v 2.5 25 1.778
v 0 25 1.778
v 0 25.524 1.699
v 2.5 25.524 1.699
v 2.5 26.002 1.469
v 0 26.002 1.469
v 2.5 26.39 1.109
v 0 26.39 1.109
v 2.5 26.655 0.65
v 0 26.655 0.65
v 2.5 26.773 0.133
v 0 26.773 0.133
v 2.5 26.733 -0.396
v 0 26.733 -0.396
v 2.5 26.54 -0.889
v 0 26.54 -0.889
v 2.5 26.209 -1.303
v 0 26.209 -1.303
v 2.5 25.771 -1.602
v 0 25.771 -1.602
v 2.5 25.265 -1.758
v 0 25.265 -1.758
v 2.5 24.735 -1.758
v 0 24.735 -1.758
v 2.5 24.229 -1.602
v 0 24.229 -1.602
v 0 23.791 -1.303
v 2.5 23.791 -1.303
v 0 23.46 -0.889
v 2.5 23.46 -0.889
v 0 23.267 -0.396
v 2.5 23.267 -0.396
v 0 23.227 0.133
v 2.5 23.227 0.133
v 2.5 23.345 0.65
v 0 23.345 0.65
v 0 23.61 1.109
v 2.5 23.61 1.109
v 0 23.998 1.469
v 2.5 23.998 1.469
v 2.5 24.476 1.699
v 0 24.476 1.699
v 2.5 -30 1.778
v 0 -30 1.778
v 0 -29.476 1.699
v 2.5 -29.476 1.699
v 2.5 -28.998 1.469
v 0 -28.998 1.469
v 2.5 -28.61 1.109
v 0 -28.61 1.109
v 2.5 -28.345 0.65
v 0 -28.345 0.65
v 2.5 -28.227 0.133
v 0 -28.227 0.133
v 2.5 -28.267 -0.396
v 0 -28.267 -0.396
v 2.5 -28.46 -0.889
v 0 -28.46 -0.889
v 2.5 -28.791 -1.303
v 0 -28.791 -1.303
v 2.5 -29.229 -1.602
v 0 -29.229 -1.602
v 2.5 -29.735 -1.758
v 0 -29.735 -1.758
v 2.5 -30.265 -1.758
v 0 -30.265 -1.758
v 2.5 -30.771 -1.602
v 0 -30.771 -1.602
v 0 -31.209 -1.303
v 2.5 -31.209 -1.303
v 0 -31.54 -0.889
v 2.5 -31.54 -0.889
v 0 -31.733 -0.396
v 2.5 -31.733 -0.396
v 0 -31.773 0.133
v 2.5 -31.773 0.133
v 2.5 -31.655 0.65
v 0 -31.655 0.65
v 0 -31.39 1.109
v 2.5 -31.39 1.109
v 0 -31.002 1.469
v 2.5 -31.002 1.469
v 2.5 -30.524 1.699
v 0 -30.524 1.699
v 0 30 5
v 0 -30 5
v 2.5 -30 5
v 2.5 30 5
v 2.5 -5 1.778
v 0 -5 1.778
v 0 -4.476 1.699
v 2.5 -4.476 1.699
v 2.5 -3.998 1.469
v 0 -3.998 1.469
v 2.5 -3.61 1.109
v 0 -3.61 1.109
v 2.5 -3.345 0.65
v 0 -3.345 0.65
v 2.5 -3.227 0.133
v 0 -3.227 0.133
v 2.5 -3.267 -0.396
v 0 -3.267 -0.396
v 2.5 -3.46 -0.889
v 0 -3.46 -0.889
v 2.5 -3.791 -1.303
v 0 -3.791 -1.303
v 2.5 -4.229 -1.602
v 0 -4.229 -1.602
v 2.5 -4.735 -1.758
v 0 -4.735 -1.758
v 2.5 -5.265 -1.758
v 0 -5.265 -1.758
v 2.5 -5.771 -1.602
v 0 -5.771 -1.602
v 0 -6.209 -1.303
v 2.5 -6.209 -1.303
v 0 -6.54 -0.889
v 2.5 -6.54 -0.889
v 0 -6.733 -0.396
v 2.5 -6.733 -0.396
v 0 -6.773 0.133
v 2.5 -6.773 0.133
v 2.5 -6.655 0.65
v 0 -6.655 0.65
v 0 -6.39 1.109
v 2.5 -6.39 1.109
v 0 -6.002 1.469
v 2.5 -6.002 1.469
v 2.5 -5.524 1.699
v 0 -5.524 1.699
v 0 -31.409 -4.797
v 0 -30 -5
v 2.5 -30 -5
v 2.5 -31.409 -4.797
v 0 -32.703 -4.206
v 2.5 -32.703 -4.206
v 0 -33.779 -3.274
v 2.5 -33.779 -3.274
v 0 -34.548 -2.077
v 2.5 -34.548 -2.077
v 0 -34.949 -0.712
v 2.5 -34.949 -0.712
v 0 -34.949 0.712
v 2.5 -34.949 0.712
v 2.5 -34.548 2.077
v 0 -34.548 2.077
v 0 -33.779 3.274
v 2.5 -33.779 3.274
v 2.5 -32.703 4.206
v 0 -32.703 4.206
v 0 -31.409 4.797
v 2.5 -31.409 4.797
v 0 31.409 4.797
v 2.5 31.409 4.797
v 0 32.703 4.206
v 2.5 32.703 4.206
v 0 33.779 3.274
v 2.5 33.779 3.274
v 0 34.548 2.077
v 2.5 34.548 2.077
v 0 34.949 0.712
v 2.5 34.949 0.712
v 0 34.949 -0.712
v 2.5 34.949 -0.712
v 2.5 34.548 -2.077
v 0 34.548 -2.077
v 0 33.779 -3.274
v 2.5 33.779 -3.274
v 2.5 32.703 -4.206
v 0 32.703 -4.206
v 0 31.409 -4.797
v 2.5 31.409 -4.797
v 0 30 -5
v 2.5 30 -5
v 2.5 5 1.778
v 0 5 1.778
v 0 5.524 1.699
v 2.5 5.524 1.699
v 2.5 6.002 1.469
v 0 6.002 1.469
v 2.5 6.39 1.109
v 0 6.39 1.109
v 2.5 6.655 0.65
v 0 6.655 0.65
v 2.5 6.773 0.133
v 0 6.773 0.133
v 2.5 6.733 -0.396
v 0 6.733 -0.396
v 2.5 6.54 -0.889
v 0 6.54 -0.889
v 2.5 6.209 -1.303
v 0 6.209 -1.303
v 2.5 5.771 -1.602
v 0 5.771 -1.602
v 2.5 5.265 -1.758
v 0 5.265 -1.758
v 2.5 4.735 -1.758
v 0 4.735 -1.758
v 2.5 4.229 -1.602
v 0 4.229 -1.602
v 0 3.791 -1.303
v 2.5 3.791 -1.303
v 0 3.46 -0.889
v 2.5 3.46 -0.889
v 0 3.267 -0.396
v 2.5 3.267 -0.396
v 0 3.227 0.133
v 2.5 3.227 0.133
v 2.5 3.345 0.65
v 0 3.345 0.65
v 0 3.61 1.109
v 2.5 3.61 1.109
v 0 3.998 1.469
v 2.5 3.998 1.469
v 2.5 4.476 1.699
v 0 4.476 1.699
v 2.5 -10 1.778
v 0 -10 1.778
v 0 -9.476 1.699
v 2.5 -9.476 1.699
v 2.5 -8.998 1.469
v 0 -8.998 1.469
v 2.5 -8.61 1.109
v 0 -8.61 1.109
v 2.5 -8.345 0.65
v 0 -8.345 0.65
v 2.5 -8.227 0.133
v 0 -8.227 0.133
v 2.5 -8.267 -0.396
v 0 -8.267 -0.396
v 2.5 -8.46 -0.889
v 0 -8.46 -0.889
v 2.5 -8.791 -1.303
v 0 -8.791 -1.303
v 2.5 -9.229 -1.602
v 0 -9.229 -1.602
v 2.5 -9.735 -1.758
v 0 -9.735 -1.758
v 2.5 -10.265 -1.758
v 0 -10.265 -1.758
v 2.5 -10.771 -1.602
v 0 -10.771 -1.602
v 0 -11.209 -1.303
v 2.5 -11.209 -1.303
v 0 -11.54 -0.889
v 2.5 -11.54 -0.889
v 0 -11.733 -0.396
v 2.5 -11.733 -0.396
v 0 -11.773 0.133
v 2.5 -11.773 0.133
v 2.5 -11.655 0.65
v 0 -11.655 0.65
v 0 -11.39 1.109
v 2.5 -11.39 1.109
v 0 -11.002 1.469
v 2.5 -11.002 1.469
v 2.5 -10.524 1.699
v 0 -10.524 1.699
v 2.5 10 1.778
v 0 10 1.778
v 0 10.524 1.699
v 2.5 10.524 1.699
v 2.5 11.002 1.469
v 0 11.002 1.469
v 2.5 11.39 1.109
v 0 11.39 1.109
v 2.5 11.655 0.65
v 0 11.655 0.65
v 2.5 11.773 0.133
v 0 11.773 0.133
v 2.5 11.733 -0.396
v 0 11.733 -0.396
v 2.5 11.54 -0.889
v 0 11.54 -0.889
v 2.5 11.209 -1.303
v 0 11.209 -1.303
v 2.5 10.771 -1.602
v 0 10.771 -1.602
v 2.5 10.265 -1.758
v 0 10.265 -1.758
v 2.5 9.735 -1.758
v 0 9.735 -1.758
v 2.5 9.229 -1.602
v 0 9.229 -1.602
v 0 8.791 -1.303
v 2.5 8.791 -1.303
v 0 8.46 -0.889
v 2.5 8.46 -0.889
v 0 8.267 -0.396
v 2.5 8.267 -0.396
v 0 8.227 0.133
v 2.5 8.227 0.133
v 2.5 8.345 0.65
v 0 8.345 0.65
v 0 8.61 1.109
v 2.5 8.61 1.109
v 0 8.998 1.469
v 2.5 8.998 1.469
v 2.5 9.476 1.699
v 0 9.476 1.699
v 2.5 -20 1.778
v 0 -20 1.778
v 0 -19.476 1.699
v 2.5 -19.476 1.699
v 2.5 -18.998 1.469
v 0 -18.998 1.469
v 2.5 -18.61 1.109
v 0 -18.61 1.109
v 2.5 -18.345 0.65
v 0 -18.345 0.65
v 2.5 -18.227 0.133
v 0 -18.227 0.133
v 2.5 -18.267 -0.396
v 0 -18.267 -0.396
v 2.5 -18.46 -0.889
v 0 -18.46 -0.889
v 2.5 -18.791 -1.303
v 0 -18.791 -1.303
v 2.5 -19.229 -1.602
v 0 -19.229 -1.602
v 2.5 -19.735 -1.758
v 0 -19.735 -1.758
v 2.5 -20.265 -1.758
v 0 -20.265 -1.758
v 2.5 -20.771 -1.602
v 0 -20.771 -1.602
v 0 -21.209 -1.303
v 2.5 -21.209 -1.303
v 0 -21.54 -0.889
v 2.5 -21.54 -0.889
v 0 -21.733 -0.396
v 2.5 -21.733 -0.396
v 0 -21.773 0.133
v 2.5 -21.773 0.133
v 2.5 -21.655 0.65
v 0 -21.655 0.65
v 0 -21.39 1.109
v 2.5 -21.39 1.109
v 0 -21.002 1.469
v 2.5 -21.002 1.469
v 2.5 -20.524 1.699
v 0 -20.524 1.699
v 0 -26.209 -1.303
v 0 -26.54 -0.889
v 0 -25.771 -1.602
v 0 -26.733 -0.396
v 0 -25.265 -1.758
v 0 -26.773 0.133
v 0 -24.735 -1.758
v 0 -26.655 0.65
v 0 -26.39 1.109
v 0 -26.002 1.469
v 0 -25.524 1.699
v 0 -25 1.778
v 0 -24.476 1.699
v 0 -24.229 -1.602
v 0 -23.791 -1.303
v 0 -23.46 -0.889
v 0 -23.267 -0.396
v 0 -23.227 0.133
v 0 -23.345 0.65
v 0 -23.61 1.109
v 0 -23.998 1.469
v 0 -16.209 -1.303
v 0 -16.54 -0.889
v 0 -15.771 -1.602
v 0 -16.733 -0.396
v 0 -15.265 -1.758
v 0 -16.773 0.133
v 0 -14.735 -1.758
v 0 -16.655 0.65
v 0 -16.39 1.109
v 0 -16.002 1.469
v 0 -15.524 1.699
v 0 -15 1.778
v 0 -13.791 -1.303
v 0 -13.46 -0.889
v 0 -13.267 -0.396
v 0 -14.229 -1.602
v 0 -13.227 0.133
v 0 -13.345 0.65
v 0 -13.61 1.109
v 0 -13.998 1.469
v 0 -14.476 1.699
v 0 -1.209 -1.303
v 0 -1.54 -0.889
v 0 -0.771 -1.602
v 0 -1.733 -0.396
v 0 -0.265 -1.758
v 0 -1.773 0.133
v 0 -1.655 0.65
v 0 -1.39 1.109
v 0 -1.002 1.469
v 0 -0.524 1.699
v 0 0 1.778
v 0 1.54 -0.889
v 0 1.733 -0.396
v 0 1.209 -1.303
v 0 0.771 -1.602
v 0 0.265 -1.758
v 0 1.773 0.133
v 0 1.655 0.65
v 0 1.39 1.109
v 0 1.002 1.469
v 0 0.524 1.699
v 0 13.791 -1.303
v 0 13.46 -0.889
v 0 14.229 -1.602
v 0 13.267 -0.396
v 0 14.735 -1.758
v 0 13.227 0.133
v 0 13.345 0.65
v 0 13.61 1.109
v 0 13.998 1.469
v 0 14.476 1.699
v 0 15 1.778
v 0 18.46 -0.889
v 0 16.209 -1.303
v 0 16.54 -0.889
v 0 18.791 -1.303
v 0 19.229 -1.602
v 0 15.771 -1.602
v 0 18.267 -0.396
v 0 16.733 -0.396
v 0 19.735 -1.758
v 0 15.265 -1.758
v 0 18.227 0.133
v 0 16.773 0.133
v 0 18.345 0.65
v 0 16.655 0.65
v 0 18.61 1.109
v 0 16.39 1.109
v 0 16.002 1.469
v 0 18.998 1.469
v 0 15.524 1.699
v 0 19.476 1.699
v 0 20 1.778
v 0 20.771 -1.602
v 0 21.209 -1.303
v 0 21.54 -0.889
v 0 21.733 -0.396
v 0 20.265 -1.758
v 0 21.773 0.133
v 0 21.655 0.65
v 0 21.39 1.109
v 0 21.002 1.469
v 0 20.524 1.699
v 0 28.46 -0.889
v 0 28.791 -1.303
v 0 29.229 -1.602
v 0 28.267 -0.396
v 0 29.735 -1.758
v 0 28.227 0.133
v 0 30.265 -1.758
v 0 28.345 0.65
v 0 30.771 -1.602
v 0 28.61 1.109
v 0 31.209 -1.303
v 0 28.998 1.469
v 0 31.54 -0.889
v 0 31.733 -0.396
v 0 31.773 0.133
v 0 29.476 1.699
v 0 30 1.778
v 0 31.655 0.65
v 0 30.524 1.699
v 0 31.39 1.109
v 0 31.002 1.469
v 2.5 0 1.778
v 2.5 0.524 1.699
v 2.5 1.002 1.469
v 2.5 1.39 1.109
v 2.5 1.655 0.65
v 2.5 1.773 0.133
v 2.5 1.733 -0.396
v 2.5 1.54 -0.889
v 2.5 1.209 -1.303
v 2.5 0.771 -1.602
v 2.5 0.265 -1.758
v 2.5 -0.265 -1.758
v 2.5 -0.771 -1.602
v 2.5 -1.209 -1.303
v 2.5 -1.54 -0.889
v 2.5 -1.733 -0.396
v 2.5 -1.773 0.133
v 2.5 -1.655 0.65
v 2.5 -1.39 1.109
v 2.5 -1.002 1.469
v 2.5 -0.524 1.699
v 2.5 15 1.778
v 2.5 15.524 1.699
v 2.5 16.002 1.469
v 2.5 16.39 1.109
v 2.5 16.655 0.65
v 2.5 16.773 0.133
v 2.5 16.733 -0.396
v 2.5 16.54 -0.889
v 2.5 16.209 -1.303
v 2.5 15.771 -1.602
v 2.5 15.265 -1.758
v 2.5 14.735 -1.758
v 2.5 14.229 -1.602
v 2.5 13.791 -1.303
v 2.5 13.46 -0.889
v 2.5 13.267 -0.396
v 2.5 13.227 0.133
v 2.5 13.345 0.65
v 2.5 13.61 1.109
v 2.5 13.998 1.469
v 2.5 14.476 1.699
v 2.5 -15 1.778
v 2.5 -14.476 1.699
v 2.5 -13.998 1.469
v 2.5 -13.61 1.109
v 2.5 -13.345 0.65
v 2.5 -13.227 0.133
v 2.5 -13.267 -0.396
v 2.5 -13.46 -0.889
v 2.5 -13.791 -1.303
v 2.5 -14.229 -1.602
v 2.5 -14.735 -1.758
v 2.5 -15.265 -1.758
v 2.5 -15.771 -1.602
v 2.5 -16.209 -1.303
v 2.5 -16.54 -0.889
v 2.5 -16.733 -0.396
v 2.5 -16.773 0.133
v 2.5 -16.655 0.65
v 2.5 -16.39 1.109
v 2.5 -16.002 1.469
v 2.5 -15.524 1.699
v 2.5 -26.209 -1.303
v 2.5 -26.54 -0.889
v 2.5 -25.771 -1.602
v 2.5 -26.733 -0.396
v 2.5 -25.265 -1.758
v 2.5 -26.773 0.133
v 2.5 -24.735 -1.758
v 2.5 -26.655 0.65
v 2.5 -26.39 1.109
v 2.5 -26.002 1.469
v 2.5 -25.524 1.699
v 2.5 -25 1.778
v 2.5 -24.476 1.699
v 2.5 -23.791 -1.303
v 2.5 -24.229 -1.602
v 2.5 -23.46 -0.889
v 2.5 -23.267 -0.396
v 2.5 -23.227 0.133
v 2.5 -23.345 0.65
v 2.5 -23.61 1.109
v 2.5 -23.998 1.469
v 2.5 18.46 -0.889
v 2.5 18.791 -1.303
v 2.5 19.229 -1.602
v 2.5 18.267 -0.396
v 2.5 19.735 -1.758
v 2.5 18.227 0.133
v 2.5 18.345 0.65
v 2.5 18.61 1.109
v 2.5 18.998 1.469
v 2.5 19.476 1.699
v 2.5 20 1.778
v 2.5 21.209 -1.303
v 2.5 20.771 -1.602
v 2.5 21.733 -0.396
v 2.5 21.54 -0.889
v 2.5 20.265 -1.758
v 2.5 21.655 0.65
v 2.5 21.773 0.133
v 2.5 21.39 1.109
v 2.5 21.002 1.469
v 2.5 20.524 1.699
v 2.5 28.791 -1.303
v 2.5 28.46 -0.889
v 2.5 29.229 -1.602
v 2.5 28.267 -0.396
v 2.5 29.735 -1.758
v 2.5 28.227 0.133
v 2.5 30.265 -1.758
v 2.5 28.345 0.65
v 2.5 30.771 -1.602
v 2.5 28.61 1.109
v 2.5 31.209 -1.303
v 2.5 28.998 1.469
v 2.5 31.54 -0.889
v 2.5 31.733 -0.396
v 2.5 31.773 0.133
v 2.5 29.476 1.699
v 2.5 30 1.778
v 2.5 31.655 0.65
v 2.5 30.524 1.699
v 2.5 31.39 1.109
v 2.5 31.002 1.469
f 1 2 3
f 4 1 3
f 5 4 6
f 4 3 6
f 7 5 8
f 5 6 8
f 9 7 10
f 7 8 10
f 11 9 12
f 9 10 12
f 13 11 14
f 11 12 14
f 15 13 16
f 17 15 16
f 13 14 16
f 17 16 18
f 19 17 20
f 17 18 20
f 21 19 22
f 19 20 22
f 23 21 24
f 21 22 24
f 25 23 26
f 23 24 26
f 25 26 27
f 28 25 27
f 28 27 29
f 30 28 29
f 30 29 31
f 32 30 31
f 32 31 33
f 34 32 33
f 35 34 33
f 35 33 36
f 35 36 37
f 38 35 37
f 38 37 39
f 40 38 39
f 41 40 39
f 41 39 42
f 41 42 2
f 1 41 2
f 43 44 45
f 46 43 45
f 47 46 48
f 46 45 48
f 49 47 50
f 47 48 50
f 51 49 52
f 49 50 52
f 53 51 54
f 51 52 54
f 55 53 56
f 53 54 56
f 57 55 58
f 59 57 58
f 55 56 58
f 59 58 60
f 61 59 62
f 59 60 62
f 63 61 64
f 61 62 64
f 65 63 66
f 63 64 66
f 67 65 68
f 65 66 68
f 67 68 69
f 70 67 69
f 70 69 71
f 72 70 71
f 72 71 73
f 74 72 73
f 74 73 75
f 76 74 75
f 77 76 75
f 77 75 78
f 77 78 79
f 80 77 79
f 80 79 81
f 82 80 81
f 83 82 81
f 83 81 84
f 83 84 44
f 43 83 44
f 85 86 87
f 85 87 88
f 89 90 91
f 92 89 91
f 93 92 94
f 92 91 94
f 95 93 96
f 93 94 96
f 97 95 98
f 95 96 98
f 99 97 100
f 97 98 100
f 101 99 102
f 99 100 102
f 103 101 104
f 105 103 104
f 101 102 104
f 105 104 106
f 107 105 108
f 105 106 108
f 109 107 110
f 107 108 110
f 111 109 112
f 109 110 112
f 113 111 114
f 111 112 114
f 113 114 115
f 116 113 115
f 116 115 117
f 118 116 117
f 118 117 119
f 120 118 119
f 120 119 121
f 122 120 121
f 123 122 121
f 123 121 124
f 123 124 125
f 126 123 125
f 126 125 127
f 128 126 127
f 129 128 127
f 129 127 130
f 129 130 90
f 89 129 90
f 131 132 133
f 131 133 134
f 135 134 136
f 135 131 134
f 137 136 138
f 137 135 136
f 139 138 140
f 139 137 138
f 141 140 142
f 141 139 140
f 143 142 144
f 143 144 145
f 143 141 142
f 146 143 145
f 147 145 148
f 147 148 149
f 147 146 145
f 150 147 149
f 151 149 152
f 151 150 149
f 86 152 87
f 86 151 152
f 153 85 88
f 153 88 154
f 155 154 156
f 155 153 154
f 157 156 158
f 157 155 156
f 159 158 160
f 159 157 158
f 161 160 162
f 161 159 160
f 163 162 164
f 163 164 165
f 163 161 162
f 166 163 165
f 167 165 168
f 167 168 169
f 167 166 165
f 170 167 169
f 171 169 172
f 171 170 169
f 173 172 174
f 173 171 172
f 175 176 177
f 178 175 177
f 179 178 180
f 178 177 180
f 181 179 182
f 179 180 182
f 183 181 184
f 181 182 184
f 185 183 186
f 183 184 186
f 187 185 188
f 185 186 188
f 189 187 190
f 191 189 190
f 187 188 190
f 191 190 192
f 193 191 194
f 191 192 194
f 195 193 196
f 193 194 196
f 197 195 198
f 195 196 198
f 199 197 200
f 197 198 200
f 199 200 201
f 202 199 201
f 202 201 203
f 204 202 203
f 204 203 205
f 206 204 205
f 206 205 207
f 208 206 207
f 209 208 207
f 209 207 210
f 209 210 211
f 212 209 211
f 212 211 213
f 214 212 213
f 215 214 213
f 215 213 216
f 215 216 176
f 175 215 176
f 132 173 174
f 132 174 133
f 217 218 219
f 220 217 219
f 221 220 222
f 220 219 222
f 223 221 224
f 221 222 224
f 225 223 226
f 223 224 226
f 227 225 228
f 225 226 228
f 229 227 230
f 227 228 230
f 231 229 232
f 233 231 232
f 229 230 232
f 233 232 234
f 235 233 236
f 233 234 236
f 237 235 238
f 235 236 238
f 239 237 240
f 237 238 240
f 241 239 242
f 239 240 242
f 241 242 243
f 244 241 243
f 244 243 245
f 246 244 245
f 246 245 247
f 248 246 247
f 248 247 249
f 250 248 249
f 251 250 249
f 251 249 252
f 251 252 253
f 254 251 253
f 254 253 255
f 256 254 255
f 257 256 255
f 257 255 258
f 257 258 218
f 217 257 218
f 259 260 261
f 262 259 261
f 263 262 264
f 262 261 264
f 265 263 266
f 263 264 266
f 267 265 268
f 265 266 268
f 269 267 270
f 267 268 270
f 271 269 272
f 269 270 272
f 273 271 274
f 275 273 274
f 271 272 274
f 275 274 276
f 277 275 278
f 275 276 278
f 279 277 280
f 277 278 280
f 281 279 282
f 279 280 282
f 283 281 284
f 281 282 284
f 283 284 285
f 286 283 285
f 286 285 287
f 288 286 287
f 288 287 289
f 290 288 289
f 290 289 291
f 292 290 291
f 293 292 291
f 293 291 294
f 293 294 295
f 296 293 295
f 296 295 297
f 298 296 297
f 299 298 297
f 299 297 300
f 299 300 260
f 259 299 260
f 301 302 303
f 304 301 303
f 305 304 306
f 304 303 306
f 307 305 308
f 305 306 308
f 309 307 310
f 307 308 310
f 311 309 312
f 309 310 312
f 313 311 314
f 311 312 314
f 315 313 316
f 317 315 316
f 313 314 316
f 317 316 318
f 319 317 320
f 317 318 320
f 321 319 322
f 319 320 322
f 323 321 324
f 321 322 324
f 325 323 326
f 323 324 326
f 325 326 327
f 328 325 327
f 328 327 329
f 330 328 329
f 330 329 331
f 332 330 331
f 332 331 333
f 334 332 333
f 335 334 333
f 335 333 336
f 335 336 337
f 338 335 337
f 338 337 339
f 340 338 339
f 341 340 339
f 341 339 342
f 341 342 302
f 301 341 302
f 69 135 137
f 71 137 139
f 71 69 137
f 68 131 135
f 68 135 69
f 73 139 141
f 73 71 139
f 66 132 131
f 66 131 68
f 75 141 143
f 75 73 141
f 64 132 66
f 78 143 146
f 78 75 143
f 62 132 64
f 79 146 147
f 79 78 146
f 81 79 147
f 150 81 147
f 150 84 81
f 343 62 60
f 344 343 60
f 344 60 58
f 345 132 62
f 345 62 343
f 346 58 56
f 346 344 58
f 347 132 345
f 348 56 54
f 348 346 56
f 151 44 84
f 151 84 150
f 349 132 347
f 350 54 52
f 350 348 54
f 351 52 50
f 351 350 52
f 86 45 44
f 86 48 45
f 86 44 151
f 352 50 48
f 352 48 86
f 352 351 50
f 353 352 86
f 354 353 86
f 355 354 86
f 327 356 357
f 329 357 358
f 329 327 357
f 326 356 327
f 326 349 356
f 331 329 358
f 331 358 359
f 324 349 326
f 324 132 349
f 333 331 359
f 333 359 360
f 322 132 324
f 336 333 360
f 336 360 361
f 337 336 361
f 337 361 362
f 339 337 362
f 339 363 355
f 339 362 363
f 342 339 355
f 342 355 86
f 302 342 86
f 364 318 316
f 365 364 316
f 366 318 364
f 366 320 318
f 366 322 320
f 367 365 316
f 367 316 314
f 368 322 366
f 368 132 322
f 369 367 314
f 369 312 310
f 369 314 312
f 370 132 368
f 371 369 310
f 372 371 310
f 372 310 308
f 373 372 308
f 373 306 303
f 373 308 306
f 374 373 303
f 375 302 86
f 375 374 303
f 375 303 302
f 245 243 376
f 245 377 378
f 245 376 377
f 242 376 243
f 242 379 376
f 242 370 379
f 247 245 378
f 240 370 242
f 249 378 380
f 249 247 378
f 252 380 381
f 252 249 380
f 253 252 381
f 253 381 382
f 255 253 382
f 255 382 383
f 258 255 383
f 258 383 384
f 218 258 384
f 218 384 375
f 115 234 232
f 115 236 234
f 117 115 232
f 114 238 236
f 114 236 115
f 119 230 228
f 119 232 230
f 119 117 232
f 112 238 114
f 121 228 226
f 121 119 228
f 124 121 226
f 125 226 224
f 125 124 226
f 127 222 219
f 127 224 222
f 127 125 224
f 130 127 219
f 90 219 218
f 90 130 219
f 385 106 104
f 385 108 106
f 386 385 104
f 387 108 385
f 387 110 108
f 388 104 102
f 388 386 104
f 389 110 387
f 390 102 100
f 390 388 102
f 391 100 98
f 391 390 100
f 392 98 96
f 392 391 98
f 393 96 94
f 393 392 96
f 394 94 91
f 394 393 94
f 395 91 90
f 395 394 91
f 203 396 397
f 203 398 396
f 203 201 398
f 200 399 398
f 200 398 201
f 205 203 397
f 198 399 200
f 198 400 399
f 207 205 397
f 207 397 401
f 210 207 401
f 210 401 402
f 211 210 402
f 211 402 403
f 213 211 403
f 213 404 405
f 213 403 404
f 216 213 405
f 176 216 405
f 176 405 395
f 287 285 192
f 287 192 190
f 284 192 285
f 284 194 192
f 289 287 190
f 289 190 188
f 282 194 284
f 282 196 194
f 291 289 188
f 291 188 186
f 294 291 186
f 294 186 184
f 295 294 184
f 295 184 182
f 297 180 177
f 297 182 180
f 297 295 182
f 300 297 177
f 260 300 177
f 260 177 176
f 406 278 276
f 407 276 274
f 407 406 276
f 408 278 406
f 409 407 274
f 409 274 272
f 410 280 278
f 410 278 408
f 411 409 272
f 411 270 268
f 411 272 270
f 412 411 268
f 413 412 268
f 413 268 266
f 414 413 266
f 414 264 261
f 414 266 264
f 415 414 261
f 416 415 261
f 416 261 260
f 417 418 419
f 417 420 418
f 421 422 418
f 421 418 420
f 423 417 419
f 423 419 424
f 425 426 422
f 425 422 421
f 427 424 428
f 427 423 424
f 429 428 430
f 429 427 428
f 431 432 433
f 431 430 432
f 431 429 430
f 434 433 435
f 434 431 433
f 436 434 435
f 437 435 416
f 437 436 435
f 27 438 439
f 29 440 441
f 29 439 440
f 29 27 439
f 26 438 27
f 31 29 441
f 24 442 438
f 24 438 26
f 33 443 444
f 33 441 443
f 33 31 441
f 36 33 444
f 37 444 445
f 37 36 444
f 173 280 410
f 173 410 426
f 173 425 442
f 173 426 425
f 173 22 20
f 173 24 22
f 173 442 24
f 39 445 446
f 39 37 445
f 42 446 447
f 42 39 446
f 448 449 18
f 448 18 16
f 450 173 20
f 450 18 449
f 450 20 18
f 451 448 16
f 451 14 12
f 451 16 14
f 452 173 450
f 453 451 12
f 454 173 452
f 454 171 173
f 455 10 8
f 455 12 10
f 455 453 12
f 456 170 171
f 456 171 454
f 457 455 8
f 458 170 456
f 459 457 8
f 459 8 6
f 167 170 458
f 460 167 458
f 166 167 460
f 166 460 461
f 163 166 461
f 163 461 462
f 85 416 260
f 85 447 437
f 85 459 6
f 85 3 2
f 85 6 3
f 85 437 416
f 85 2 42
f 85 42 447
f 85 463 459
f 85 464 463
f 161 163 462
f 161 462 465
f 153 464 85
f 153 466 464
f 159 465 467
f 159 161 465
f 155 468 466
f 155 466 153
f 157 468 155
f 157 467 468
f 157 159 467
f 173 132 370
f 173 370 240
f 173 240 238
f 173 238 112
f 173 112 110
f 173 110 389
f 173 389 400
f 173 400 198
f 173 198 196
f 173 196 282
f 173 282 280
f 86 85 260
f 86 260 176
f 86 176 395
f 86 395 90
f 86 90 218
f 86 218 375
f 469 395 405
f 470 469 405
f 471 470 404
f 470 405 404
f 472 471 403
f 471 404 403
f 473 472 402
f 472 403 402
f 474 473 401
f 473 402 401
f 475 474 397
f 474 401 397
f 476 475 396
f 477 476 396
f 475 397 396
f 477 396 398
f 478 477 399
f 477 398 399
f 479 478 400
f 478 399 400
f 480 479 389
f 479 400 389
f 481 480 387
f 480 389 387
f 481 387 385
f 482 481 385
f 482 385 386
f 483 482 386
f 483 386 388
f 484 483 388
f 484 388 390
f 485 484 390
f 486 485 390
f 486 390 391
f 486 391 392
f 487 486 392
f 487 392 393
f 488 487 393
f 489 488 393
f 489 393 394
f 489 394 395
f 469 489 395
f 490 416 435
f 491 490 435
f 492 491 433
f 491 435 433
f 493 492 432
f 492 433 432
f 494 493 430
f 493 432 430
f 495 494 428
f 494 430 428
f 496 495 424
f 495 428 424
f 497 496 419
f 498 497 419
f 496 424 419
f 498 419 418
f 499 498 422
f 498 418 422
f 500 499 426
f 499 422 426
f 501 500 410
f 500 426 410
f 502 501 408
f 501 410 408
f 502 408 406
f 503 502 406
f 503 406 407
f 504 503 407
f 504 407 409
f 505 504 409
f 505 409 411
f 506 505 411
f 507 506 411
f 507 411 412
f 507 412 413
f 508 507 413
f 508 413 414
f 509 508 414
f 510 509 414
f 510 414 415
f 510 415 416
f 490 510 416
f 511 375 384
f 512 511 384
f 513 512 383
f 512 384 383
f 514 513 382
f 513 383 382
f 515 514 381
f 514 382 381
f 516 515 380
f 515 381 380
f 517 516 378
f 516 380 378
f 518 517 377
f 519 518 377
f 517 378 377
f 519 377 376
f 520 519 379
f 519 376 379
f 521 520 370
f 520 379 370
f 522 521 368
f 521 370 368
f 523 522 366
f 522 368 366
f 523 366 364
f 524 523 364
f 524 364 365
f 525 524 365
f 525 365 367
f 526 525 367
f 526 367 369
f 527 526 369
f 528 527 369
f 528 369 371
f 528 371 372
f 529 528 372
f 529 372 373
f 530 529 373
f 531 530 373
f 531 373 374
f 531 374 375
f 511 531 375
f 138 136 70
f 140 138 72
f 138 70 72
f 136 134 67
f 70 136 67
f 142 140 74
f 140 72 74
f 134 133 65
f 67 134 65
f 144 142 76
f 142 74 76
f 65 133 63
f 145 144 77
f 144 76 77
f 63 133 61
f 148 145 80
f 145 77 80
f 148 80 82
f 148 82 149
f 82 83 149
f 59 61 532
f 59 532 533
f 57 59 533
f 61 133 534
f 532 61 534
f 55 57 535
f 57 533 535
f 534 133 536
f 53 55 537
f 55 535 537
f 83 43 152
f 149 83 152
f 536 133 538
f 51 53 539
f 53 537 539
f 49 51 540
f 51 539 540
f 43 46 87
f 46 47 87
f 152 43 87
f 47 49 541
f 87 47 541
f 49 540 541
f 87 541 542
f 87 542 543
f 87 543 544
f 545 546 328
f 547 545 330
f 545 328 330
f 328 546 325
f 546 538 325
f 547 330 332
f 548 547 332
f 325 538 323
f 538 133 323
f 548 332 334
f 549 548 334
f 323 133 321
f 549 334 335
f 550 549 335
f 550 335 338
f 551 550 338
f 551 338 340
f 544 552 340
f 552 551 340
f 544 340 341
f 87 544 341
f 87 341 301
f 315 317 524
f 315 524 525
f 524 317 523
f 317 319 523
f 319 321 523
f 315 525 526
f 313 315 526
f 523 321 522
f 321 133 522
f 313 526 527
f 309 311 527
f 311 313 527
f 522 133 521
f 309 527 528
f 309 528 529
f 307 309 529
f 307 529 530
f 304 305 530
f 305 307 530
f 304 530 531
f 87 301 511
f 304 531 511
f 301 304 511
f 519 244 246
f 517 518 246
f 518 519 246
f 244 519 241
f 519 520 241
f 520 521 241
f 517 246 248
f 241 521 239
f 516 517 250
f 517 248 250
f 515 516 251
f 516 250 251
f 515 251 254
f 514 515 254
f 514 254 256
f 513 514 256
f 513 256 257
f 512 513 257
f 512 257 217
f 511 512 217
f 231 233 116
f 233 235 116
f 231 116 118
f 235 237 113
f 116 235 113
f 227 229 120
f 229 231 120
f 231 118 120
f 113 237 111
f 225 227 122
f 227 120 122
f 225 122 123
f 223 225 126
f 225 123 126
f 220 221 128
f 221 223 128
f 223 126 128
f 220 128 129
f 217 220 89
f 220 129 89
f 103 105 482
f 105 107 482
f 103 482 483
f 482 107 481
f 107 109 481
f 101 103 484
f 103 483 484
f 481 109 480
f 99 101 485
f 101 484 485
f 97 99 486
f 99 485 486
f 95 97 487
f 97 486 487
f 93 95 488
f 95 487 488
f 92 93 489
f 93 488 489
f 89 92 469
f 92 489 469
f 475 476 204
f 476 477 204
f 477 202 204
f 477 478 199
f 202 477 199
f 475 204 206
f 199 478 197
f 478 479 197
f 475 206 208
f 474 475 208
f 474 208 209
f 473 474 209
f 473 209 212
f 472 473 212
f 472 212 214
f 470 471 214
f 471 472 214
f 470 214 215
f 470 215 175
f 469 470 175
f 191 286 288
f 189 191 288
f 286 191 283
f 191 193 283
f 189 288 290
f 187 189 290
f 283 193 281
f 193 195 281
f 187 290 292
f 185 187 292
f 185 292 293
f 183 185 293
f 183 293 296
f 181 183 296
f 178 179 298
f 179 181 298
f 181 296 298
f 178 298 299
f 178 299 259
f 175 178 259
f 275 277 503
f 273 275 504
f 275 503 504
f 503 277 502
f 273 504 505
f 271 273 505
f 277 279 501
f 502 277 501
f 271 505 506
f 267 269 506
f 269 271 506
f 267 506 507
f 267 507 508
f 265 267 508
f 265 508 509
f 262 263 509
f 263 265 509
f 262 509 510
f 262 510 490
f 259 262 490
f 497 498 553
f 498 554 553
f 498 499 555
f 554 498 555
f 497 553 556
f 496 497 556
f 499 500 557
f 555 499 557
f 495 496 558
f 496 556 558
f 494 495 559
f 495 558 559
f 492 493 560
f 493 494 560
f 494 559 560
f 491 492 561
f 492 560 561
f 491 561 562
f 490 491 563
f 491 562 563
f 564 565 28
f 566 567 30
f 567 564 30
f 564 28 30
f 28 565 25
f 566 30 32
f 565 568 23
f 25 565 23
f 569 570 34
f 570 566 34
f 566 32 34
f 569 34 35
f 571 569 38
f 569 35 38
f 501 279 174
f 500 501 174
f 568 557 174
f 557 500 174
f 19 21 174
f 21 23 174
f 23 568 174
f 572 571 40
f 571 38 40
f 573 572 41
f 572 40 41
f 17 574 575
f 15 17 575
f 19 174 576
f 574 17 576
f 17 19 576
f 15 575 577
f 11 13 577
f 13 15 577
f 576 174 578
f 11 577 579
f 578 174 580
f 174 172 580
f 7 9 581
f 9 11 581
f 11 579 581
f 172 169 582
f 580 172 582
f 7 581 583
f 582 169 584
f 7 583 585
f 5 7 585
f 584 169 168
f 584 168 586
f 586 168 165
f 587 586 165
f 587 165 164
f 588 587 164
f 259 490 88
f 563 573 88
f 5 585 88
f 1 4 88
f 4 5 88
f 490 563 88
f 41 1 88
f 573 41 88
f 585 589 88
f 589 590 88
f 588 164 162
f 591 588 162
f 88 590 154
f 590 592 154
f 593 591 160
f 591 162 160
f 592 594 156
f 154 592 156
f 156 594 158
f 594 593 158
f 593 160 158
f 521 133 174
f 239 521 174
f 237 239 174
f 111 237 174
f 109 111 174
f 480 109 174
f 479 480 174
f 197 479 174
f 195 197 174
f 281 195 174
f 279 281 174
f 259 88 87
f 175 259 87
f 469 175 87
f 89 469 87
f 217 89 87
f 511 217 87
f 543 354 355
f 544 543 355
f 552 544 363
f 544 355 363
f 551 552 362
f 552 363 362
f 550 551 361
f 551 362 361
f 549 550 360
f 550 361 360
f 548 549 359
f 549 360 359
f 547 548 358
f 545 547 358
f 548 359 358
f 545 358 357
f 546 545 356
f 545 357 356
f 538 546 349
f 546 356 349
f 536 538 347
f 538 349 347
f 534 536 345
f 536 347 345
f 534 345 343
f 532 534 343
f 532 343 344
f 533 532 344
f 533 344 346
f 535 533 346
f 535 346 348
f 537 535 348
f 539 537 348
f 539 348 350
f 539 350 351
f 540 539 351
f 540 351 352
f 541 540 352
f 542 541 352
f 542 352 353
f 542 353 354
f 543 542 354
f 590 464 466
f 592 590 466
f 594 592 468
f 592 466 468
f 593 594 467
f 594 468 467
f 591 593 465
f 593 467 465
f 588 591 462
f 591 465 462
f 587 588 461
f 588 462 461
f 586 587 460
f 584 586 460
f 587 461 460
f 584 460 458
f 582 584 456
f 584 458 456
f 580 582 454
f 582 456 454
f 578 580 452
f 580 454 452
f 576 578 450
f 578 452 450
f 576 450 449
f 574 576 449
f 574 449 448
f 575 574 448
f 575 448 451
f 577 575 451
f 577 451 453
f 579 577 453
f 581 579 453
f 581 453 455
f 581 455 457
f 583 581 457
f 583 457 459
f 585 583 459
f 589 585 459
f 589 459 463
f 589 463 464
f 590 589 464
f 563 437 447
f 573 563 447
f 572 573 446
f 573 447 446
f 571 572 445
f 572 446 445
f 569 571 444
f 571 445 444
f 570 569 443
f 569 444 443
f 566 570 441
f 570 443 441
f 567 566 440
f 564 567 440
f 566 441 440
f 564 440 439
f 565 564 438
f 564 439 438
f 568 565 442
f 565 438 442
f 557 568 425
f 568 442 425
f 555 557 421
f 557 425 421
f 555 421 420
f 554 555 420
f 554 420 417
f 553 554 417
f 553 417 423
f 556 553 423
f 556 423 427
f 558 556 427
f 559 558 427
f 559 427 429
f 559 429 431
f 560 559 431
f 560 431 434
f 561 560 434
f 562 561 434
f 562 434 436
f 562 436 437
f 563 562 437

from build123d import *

# Parameters (mm, degrees)
BOSS_EXTRUDE1_DEPTH          = 2.5
F_5_32_0_14_DIAMETER_HOLE1_D = 3.556
LPATTERN1_COUNT              = 7
LPATTERN1_PITCH              = 5
MIRROR1_COPY_1_D             = 3.556
MIRROR1_COPY_2_D             = 3.556
MIRROR1_COPY_3_D             = 3.556
MIRROR1_COPY_4_D             = 3.556
MIRROR1_COPY_5_D             = 3.556
MIRROR1_COPY_6_D             = 3.556
MIRROR1_COPY_7_D             = 3.556


with BuildPart() as part:
    # Sketch1 → Boss-Extrude1 (new body)
    with BuildSketch(Plane(origin=(0, 0, 0), x_dir=(0, 0, -1), z_dir=(1, 0, 0))):
        with BuildLine():
            Line((5, 30), (5, -30))
            ThreePointArc((5, -30), (0, -35), (-5, -30))
            Line((-5, -30), (-5, 30))
            ThreePointArc((-5, 30), (0, 35), (5, 30))
        make_face()
    extrude(amount=BOSS_EXTRUDE1_DEPTH)

    # 5/32 (0.14) Diameter Hole1 (through all)
    with Locations(Plane(origin=(2.5, 0, 0), x_dir=(0, 0, -1), z_dir=(1, 0, 0))):
        with Locations((0, 0)):
            f_5_32_0_14_diameter_hole1 = Hole(F_5_32_0_14_DIAMETER_HOLE1_D / 2)

    # LPattern1: 5/32 (0.14) Diameter Hole1 ×7
    with Locations(*[(0, i * LPATTERN1_PITCH, 0) for i in range(1, LPATTERN1_COUNT)]):
        add(f_5_32_0_14_diameter_hole1, mode=Mode.SUBTRACT)

    # Mirror1 copy 1 (through all)
    with Locations(Plane(origin=(2.5, -5, 0), x_dir=(0, 0, -1), z_dir=(1, 0, 0))):
        with Locations((0, 0)):
            Hole(MIRROR1_COPY_1_D / 2)

    # Mirror1 copy 2 (through all)
    with Locations(Plane(origin=(2.5, -10, 0), x_dir=(0, 0, -1), z_dir=(1, 0, 0))):
        with Locations((0, 0)):
            Hole(MIRROR1_COPY_2_D / 2)

    # Mirror1 copy 3 (through all)
    with Locations(Plane(origin=(2.5, -15, 0), x_dir=(0, 0, -1), z_dir=(1, 0, 0))):
        with Locations((0, 0)):
            Hole(MIRROR1_COPY_3_D / 2)

    # Mirror1 copy 4 (through all)
    with Locations(Plane(origin=(2.5, -20, 0), x_dir=(0, 0, -1), z_dir=(1, 0, 0))):
        with Locations((0, 0)):
            Hole(MIRROR1_COPY_4_D / 2)

    # Mirror1 copy 5 (through all)
    with Locations(Plane(origin=(2.5, -25, 0), x_dir=(0, 0, -1), z_dir=(1, 0, 0))):
        with Locations((0, 0)):
            Hole(MIRROR1_COPY_5_D / 2)

    # Mirror1 copy 6 (through all)
    with Locations(Plane(origin=(2.5, -30, 0), x_dir=(0, 0, -1), z_dir=(1, 0, 0))):
        with Locations((0, 0)):
            Hole(MIRROR1_COPY_6_D / 2)

    # Mirror1 copy 7 (through all)
    with Locations(Plane(origin=(2.5, 0, 0), x_dir=(0, 0, -1), z_dir=(1, 0, 0))):
        with Locations((0, 0)):
            Hole(MIRROR1_COPY_7_D / 2)


solid = part.part
